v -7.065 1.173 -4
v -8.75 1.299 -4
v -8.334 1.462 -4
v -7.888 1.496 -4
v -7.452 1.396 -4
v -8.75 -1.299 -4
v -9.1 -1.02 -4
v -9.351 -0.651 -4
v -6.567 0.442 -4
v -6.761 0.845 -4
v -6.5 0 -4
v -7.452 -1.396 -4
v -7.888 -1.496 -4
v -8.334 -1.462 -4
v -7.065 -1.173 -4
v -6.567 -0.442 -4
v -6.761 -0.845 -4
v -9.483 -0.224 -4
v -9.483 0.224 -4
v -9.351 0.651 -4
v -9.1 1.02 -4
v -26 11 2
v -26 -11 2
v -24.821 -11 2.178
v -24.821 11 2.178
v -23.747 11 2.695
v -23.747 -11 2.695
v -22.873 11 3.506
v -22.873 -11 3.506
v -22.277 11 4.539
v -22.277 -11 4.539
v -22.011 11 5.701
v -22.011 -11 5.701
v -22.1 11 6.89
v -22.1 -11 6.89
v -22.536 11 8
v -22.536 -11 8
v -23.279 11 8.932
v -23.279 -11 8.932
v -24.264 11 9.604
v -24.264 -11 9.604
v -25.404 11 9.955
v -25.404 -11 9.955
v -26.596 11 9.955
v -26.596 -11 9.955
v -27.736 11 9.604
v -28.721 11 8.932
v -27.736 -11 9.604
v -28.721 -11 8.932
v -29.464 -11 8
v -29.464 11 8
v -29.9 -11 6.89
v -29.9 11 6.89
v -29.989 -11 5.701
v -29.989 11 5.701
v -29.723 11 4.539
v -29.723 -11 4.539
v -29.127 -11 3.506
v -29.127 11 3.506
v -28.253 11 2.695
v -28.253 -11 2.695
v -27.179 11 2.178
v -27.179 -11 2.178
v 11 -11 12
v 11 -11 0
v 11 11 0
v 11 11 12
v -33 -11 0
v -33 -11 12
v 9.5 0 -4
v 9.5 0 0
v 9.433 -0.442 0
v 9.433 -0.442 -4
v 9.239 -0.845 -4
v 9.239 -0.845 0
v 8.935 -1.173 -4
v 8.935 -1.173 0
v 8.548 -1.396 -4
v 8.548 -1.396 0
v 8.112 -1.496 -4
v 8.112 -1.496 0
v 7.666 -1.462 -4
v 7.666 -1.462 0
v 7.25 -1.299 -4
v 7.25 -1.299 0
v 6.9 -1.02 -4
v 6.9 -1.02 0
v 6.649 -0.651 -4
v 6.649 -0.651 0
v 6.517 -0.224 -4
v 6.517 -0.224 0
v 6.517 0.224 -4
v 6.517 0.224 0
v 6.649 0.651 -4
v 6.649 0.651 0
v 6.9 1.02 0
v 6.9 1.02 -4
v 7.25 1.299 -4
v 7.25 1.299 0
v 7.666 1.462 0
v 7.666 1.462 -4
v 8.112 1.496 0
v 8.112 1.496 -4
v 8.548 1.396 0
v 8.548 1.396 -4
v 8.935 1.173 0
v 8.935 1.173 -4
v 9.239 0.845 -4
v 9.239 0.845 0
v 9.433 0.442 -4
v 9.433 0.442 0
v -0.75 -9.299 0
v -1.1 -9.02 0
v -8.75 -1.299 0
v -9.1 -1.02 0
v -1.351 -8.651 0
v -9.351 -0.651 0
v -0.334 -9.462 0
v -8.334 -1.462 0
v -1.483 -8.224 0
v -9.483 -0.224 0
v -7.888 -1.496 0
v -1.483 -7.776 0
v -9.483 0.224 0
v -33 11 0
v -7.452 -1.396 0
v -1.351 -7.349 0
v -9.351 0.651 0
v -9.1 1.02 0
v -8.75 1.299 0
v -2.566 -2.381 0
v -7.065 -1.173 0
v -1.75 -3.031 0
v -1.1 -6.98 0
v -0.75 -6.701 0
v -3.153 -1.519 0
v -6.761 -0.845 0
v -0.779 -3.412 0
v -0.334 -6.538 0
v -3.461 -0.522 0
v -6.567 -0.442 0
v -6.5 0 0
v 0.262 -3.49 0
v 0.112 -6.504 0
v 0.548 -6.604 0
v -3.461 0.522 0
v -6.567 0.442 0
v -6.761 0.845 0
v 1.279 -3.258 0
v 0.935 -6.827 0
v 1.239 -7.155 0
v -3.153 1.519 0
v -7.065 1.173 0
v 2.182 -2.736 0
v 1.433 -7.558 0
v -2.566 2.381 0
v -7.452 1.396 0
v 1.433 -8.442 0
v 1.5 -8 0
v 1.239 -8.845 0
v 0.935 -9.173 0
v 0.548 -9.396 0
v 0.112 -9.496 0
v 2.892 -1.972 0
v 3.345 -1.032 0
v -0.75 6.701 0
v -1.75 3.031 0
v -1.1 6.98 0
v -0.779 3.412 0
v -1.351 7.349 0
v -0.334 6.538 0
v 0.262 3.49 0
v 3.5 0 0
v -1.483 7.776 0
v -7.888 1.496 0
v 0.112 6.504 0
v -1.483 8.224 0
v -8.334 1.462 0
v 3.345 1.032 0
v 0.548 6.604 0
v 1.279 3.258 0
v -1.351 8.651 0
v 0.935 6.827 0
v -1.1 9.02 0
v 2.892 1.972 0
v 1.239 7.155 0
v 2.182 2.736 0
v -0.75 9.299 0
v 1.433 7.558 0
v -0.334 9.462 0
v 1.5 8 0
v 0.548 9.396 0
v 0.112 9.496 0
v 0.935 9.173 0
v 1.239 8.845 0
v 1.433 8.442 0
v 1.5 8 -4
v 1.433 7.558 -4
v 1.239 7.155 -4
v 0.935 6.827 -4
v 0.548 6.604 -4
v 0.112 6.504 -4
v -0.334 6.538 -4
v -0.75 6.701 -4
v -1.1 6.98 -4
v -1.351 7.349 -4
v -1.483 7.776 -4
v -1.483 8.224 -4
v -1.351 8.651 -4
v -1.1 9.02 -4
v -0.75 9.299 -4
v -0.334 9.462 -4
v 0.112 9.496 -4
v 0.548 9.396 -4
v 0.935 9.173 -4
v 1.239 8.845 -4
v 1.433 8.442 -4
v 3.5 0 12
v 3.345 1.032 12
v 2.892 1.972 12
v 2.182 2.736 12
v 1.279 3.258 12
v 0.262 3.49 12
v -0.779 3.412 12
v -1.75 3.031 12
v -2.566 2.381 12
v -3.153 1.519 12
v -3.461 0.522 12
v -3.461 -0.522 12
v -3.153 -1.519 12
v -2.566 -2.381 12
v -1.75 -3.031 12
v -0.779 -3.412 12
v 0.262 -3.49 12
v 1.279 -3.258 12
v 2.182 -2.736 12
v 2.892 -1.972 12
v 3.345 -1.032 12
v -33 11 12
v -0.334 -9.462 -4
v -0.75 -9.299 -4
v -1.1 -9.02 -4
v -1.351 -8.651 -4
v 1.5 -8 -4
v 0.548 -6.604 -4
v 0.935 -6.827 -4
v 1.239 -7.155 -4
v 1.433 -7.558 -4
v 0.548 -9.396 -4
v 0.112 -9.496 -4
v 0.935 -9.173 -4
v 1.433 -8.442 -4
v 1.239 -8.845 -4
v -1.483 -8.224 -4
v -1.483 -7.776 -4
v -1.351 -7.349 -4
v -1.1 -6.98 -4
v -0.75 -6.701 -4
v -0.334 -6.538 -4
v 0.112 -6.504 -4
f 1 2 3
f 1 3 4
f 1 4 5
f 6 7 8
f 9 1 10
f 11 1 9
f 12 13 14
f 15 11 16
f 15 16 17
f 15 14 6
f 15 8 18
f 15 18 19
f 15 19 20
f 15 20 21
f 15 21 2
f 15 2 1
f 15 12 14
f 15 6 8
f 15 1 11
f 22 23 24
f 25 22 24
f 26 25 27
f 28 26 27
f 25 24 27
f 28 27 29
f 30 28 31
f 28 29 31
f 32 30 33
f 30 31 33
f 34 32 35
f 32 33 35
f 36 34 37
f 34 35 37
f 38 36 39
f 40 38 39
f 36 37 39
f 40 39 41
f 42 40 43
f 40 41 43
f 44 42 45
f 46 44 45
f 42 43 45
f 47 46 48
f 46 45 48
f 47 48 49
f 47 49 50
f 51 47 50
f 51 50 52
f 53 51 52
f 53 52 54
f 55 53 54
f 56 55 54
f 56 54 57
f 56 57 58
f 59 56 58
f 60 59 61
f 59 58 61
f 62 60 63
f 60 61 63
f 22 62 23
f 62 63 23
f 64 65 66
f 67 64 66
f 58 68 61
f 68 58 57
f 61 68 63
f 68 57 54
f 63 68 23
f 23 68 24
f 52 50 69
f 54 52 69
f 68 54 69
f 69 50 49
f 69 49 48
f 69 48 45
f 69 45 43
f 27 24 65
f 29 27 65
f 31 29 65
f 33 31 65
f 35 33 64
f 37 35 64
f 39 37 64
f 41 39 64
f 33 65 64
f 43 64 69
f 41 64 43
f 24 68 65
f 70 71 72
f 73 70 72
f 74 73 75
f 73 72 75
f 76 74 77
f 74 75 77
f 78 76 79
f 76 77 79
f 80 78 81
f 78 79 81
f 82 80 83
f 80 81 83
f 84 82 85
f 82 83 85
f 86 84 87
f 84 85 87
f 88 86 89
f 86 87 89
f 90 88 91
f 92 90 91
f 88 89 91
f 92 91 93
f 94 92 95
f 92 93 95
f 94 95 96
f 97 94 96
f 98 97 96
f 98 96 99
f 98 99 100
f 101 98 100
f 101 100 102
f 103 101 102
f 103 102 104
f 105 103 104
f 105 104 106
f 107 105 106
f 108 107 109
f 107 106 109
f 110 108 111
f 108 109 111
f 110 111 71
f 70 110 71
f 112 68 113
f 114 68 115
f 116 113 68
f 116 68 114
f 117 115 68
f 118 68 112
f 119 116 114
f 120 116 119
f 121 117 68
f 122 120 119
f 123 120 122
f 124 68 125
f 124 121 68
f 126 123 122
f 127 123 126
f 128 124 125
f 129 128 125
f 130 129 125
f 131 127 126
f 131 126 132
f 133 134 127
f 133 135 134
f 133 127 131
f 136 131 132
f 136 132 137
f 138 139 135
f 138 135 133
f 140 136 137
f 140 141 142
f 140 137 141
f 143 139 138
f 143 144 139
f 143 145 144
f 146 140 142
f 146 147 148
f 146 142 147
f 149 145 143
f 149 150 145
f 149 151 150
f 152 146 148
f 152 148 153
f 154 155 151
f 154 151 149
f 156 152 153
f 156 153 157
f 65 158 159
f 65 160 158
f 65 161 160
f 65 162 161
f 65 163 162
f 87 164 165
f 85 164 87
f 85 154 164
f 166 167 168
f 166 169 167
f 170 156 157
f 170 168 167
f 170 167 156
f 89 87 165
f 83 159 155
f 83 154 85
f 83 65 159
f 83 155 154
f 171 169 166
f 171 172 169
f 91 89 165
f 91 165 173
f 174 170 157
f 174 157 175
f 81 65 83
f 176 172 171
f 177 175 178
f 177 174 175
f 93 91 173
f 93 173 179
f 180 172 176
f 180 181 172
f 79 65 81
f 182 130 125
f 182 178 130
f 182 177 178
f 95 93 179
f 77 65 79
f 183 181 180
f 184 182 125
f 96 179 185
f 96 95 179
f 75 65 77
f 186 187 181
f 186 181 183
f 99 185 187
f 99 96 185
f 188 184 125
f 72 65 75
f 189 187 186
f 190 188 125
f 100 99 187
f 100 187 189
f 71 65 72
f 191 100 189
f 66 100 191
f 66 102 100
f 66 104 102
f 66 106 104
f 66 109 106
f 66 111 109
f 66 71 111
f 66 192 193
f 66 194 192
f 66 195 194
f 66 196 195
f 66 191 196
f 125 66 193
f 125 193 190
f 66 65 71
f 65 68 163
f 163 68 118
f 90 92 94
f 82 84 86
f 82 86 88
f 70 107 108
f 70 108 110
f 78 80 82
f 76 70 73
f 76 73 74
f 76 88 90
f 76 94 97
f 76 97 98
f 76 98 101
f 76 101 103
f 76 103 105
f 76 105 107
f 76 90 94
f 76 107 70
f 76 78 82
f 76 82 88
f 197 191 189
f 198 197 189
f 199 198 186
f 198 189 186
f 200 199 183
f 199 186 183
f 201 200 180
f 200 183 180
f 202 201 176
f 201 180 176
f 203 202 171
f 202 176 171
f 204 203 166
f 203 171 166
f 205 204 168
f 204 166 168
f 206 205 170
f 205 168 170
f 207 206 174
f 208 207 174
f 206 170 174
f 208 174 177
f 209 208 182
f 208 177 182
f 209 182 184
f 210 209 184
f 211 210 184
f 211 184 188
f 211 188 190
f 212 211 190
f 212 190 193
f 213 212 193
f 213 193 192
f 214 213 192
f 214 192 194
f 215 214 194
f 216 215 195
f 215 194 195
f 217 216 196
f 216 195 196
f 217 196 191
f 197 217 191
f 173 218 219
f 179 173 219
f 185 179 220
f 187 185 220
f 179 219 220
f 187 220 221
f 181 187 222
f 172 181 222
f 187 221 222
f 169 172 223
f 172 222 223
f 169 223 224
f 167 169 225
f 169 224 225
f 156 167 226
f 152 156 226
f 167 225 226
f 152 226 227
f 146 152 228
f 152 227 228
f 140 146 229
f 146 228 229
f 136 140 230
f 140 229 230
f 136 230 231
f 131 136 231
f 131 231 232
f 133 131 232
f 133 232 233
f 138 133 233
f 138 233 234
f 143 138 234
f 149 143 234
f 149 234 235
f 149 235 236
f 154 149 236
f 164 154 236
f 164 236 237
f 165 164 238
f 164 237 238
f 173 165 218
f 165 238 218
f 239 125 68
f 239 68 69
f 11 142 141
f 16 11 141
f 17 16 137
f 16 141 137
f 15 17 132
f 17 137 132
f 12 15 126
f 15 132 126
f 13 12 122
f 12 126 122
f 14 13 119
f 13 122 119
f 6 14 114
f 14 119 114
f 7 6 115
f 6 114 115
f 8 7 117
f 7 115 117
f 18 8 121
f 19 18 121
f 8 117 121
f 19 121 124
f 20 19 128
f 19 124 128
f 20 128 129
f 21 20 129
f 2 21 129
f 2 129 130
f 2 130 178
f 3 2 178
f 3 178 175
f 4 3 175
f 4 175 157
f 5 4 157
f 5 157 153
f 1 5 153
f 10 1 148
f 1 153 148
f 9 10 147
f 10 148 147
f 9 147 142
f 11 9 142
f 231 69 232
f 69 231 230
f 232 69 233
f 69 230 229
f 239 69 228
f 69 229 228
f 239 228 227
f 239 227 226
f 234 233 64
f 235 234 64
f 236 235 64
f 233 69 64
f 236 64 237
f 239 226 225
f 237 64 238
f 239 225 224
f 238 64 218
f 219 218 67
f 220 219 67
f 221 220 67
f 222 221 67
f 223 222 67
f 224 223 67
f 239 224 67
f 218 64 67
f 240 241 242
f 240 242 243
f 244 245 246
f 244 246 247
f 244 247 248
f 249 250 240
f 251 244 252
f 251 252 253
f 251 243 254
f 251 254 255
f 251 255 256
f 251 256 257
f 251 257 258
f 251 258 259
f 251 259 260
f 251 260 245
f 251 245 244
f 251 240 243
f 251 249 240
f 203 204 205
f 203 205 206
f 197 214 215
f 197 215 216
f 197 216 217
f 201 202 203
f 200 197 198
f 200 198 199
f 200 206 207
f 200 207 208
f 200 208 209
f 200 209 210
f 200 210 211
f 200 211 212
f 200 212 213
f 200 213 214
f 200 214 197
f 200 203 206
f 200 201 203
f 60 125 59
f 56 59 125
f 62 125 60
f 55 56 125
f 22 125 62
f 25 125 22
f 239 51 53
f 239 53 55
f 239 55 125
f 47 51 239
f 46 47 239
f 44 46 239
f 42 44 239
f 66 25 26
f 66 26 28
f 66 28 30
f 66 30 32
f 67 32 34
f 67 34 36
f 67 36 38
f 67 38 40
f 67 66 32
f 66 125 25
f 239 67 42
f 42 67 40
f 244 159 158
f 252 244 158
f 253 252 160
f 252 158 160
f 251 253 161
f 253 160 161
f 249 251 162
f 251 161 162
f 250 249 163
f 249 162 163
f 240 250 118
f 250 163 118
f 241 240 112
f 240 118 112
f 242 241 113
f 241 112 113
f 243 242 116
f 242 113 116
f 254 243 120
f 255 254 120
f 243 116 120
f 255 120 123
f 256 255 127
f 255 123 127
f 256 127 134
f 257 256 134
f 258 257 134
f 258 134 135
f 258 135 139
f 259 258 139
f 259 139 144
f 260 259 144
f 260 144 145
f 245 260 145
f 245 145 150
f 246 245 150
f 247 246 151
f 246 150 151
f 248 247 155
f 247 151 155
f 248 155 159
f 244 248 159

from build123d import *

# Parameters (mm, degrees)
SKETCH_1_W          = 22
SKETCH_1_H          = 22
EXTRUDE_1_DEPTH     = 12
SKETCH_3_R          = 3.5
CUT_EXTRUDE_2_DEPTH = 12
SKETCH_5_R          = 1.5
EXTRUDE_2_DEPTH     = 4
SKETCH_6_W          = 12
SKETCH_6_H          = 22
EXTRUDE_3_DEPTH     = 22
SKETCH_7_R          = 4
CUT_EXTRUDE_3_DEPTH = 22


with BuildPart() as part:
    # 草图1 → 凸台-拉伸1 (new body)
    with BuildSketch(Plane.XY):
        Rectangle(SKETCH_1_W, SKETCH_1_H)
    extrude(amount=EXTRUDE_1_DEPTH)

    # 草图3 → 切除-拉伸2 (cut)
    with BuildSketch(Plane.XY.offset(12)):
        Circle(SKETCH_3_R)
    extrude(amount=-CUT_EXTRUDE_2_DEPTH, mode=Mode.SUBTRACT)

    # 草图5 → 凸台-拉伸2 (add)
    with BuildSketch(Plane(origin=(0, 0, 0), x_dir=(-1, 0, 0), z_dir=(0, 0, -1))):
        with Locations(Location((0, 8, 0), (0, 0, 180))):
            Circle(SKETCH_5_R)
        with Locations(Location((8, 0, 0), (0, 0, 180))):
            Circle(SKETCH_5_R)
        with Locations(Location((0, -8, 0), (0, 0, 180))):
            Circle(SKETCH_5_R)
        with Locations(Location((-8, 0, 0), (0, 0, 180))):
            Circle(SKETCH_5_R)
    extrude(amount=EXTRUDE_2_DEPTH)

    # 草图6 → 凸台-拉伸3 (add)
    with BuildSketch(Plane.ZY.offset(11)):
        with Locations((6, 0)):
            Rectangle(SKETCH_6_W, SKETCH_6_H)
    extrude(amount=EXTRUDE_3_DEPTH)

    # 草图7 → 切除-拉伸3 (cut)
    with BuildSketch(Plane.XZ.offset(11)):
        with Locations(Location((-26, 6, 0), (0, 0, 270))):
            Circle(SKETCH_7_R)
    extrude(amount=-CUT_EXTRUDE_3_DEPTH, mode=Mode.SUBTRACT)


solid = part.part
